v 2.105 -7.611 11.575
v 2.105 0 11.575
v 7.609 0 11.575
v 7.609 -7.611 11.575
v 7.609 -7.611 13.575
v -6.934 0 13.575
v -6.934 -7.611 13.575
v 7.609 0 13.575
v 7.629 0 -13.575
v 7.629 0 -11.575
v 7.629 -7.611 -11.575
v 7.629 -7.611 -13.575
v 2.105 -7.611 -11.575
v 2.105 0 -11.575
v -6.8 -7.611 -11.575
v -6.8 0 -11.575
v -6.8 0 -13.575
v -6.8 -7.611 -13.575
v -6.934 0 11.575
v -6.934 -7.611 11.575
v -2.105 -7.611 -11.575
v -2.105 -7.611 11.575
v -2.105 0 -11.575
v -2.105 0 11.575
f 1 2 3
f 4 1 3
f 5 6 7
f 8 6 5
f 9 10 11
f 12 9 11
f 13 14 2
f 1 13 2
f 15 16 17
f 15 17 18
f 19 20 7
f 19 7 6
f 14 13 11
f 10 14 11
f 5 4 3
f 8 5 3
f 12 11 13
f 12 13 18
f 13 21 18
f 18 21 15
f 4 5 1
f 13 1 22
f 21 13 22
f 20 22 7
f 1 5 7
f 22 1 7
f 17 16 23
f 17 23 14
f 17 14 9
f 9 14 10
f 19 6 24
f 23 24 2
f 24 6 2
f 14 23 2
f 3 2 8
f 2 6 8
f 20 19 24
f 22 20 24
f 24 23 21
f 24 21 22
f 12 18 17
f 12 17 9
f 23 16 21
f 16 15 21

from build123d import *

# Parameters (mm, degrees)
F0_W     = 4.2091126258
F0_H     = 23.15
F1_DEPTH = 7.611
F2_W     = 2.1045563129
F2_H     = 7.611
F2_W_2   = 5.5041293296
F3_DEPTH = 2
F4_W     = 4.8296524825
F4_H     = 7.611
F4_W_2   = 2.1045563129
F5_DEPTH = 2
F6_W     = 2.1045563129
F6_H     = 7.611
F6_W_2   = 5.5243599842
F7_DEPTH = 2
F8_W     = 2.1045563129
F8_H     = 7.611
F8_W_2   = 4.695874514
F9_DEPTH = 2


with BuildPart() as f1:
    # F0 (on Front) → F1 (new body)
    with BuildSketch(Plane.XZ):
        Rectangle(F0_W, F0_H)
    extrude(amount=F1_DEPTH)

    # F2 (on face) → F3 (join)
    with BuildSketch(Plane.XY.offset(11.575)):
        with Locations((1.0522781564, -3.8055)):
            Rectangle(F2_W, F2_H)
        with Locations((4.8566209777, -3.8055)):
            Rectangle(F2_W_2, F2_H)
    extrude(amount=F3_DEPTH)

    # F4 (on face) → F5 (join)
    with BuildSketch(Plane.XY.offset(11.575)):
        with Locations((-4.5193825542, -3.8055)):
            Rectangle(F4_W, F4_H)
        with Locations((-1.0522781564, -3.8055)):
            Rectangle(F4_W_2, F4_H)
    extrude(amount=F5_DEPTH)

    # F6 (on face) → F7 (join)
    with BuildSketch(Plane(origin=(0, 0, -11.575), x_dir=(1, 0, 0), z_dir=(0, 0, -1))):
        with Locations((1.0522781564, 3.8055)):
            Rectangle(F6_W, F6_H)
        with Locations((4.866736305, 3.8055)):
            Rectangle(F6_W_2, F6_H)
    extrude(amount=F7_DEPTH)

    # F8 (on face) → F9 (join)
    with BuildSketch(Plane(origin=(0, 0, -11.575), x_dir=(1, 0, 0), z_dir=(0, 0, -1))):
        with Locations((-1.0522781564, 3.8055)):
            Rectangle(F8_W, F8_H)
        with Locations((-4.4524935699, 3.8055)):
            Rectangle(F8_W_2, F8_H)
    extrude(amount=F9_DEPTH)


solid = f1.part
